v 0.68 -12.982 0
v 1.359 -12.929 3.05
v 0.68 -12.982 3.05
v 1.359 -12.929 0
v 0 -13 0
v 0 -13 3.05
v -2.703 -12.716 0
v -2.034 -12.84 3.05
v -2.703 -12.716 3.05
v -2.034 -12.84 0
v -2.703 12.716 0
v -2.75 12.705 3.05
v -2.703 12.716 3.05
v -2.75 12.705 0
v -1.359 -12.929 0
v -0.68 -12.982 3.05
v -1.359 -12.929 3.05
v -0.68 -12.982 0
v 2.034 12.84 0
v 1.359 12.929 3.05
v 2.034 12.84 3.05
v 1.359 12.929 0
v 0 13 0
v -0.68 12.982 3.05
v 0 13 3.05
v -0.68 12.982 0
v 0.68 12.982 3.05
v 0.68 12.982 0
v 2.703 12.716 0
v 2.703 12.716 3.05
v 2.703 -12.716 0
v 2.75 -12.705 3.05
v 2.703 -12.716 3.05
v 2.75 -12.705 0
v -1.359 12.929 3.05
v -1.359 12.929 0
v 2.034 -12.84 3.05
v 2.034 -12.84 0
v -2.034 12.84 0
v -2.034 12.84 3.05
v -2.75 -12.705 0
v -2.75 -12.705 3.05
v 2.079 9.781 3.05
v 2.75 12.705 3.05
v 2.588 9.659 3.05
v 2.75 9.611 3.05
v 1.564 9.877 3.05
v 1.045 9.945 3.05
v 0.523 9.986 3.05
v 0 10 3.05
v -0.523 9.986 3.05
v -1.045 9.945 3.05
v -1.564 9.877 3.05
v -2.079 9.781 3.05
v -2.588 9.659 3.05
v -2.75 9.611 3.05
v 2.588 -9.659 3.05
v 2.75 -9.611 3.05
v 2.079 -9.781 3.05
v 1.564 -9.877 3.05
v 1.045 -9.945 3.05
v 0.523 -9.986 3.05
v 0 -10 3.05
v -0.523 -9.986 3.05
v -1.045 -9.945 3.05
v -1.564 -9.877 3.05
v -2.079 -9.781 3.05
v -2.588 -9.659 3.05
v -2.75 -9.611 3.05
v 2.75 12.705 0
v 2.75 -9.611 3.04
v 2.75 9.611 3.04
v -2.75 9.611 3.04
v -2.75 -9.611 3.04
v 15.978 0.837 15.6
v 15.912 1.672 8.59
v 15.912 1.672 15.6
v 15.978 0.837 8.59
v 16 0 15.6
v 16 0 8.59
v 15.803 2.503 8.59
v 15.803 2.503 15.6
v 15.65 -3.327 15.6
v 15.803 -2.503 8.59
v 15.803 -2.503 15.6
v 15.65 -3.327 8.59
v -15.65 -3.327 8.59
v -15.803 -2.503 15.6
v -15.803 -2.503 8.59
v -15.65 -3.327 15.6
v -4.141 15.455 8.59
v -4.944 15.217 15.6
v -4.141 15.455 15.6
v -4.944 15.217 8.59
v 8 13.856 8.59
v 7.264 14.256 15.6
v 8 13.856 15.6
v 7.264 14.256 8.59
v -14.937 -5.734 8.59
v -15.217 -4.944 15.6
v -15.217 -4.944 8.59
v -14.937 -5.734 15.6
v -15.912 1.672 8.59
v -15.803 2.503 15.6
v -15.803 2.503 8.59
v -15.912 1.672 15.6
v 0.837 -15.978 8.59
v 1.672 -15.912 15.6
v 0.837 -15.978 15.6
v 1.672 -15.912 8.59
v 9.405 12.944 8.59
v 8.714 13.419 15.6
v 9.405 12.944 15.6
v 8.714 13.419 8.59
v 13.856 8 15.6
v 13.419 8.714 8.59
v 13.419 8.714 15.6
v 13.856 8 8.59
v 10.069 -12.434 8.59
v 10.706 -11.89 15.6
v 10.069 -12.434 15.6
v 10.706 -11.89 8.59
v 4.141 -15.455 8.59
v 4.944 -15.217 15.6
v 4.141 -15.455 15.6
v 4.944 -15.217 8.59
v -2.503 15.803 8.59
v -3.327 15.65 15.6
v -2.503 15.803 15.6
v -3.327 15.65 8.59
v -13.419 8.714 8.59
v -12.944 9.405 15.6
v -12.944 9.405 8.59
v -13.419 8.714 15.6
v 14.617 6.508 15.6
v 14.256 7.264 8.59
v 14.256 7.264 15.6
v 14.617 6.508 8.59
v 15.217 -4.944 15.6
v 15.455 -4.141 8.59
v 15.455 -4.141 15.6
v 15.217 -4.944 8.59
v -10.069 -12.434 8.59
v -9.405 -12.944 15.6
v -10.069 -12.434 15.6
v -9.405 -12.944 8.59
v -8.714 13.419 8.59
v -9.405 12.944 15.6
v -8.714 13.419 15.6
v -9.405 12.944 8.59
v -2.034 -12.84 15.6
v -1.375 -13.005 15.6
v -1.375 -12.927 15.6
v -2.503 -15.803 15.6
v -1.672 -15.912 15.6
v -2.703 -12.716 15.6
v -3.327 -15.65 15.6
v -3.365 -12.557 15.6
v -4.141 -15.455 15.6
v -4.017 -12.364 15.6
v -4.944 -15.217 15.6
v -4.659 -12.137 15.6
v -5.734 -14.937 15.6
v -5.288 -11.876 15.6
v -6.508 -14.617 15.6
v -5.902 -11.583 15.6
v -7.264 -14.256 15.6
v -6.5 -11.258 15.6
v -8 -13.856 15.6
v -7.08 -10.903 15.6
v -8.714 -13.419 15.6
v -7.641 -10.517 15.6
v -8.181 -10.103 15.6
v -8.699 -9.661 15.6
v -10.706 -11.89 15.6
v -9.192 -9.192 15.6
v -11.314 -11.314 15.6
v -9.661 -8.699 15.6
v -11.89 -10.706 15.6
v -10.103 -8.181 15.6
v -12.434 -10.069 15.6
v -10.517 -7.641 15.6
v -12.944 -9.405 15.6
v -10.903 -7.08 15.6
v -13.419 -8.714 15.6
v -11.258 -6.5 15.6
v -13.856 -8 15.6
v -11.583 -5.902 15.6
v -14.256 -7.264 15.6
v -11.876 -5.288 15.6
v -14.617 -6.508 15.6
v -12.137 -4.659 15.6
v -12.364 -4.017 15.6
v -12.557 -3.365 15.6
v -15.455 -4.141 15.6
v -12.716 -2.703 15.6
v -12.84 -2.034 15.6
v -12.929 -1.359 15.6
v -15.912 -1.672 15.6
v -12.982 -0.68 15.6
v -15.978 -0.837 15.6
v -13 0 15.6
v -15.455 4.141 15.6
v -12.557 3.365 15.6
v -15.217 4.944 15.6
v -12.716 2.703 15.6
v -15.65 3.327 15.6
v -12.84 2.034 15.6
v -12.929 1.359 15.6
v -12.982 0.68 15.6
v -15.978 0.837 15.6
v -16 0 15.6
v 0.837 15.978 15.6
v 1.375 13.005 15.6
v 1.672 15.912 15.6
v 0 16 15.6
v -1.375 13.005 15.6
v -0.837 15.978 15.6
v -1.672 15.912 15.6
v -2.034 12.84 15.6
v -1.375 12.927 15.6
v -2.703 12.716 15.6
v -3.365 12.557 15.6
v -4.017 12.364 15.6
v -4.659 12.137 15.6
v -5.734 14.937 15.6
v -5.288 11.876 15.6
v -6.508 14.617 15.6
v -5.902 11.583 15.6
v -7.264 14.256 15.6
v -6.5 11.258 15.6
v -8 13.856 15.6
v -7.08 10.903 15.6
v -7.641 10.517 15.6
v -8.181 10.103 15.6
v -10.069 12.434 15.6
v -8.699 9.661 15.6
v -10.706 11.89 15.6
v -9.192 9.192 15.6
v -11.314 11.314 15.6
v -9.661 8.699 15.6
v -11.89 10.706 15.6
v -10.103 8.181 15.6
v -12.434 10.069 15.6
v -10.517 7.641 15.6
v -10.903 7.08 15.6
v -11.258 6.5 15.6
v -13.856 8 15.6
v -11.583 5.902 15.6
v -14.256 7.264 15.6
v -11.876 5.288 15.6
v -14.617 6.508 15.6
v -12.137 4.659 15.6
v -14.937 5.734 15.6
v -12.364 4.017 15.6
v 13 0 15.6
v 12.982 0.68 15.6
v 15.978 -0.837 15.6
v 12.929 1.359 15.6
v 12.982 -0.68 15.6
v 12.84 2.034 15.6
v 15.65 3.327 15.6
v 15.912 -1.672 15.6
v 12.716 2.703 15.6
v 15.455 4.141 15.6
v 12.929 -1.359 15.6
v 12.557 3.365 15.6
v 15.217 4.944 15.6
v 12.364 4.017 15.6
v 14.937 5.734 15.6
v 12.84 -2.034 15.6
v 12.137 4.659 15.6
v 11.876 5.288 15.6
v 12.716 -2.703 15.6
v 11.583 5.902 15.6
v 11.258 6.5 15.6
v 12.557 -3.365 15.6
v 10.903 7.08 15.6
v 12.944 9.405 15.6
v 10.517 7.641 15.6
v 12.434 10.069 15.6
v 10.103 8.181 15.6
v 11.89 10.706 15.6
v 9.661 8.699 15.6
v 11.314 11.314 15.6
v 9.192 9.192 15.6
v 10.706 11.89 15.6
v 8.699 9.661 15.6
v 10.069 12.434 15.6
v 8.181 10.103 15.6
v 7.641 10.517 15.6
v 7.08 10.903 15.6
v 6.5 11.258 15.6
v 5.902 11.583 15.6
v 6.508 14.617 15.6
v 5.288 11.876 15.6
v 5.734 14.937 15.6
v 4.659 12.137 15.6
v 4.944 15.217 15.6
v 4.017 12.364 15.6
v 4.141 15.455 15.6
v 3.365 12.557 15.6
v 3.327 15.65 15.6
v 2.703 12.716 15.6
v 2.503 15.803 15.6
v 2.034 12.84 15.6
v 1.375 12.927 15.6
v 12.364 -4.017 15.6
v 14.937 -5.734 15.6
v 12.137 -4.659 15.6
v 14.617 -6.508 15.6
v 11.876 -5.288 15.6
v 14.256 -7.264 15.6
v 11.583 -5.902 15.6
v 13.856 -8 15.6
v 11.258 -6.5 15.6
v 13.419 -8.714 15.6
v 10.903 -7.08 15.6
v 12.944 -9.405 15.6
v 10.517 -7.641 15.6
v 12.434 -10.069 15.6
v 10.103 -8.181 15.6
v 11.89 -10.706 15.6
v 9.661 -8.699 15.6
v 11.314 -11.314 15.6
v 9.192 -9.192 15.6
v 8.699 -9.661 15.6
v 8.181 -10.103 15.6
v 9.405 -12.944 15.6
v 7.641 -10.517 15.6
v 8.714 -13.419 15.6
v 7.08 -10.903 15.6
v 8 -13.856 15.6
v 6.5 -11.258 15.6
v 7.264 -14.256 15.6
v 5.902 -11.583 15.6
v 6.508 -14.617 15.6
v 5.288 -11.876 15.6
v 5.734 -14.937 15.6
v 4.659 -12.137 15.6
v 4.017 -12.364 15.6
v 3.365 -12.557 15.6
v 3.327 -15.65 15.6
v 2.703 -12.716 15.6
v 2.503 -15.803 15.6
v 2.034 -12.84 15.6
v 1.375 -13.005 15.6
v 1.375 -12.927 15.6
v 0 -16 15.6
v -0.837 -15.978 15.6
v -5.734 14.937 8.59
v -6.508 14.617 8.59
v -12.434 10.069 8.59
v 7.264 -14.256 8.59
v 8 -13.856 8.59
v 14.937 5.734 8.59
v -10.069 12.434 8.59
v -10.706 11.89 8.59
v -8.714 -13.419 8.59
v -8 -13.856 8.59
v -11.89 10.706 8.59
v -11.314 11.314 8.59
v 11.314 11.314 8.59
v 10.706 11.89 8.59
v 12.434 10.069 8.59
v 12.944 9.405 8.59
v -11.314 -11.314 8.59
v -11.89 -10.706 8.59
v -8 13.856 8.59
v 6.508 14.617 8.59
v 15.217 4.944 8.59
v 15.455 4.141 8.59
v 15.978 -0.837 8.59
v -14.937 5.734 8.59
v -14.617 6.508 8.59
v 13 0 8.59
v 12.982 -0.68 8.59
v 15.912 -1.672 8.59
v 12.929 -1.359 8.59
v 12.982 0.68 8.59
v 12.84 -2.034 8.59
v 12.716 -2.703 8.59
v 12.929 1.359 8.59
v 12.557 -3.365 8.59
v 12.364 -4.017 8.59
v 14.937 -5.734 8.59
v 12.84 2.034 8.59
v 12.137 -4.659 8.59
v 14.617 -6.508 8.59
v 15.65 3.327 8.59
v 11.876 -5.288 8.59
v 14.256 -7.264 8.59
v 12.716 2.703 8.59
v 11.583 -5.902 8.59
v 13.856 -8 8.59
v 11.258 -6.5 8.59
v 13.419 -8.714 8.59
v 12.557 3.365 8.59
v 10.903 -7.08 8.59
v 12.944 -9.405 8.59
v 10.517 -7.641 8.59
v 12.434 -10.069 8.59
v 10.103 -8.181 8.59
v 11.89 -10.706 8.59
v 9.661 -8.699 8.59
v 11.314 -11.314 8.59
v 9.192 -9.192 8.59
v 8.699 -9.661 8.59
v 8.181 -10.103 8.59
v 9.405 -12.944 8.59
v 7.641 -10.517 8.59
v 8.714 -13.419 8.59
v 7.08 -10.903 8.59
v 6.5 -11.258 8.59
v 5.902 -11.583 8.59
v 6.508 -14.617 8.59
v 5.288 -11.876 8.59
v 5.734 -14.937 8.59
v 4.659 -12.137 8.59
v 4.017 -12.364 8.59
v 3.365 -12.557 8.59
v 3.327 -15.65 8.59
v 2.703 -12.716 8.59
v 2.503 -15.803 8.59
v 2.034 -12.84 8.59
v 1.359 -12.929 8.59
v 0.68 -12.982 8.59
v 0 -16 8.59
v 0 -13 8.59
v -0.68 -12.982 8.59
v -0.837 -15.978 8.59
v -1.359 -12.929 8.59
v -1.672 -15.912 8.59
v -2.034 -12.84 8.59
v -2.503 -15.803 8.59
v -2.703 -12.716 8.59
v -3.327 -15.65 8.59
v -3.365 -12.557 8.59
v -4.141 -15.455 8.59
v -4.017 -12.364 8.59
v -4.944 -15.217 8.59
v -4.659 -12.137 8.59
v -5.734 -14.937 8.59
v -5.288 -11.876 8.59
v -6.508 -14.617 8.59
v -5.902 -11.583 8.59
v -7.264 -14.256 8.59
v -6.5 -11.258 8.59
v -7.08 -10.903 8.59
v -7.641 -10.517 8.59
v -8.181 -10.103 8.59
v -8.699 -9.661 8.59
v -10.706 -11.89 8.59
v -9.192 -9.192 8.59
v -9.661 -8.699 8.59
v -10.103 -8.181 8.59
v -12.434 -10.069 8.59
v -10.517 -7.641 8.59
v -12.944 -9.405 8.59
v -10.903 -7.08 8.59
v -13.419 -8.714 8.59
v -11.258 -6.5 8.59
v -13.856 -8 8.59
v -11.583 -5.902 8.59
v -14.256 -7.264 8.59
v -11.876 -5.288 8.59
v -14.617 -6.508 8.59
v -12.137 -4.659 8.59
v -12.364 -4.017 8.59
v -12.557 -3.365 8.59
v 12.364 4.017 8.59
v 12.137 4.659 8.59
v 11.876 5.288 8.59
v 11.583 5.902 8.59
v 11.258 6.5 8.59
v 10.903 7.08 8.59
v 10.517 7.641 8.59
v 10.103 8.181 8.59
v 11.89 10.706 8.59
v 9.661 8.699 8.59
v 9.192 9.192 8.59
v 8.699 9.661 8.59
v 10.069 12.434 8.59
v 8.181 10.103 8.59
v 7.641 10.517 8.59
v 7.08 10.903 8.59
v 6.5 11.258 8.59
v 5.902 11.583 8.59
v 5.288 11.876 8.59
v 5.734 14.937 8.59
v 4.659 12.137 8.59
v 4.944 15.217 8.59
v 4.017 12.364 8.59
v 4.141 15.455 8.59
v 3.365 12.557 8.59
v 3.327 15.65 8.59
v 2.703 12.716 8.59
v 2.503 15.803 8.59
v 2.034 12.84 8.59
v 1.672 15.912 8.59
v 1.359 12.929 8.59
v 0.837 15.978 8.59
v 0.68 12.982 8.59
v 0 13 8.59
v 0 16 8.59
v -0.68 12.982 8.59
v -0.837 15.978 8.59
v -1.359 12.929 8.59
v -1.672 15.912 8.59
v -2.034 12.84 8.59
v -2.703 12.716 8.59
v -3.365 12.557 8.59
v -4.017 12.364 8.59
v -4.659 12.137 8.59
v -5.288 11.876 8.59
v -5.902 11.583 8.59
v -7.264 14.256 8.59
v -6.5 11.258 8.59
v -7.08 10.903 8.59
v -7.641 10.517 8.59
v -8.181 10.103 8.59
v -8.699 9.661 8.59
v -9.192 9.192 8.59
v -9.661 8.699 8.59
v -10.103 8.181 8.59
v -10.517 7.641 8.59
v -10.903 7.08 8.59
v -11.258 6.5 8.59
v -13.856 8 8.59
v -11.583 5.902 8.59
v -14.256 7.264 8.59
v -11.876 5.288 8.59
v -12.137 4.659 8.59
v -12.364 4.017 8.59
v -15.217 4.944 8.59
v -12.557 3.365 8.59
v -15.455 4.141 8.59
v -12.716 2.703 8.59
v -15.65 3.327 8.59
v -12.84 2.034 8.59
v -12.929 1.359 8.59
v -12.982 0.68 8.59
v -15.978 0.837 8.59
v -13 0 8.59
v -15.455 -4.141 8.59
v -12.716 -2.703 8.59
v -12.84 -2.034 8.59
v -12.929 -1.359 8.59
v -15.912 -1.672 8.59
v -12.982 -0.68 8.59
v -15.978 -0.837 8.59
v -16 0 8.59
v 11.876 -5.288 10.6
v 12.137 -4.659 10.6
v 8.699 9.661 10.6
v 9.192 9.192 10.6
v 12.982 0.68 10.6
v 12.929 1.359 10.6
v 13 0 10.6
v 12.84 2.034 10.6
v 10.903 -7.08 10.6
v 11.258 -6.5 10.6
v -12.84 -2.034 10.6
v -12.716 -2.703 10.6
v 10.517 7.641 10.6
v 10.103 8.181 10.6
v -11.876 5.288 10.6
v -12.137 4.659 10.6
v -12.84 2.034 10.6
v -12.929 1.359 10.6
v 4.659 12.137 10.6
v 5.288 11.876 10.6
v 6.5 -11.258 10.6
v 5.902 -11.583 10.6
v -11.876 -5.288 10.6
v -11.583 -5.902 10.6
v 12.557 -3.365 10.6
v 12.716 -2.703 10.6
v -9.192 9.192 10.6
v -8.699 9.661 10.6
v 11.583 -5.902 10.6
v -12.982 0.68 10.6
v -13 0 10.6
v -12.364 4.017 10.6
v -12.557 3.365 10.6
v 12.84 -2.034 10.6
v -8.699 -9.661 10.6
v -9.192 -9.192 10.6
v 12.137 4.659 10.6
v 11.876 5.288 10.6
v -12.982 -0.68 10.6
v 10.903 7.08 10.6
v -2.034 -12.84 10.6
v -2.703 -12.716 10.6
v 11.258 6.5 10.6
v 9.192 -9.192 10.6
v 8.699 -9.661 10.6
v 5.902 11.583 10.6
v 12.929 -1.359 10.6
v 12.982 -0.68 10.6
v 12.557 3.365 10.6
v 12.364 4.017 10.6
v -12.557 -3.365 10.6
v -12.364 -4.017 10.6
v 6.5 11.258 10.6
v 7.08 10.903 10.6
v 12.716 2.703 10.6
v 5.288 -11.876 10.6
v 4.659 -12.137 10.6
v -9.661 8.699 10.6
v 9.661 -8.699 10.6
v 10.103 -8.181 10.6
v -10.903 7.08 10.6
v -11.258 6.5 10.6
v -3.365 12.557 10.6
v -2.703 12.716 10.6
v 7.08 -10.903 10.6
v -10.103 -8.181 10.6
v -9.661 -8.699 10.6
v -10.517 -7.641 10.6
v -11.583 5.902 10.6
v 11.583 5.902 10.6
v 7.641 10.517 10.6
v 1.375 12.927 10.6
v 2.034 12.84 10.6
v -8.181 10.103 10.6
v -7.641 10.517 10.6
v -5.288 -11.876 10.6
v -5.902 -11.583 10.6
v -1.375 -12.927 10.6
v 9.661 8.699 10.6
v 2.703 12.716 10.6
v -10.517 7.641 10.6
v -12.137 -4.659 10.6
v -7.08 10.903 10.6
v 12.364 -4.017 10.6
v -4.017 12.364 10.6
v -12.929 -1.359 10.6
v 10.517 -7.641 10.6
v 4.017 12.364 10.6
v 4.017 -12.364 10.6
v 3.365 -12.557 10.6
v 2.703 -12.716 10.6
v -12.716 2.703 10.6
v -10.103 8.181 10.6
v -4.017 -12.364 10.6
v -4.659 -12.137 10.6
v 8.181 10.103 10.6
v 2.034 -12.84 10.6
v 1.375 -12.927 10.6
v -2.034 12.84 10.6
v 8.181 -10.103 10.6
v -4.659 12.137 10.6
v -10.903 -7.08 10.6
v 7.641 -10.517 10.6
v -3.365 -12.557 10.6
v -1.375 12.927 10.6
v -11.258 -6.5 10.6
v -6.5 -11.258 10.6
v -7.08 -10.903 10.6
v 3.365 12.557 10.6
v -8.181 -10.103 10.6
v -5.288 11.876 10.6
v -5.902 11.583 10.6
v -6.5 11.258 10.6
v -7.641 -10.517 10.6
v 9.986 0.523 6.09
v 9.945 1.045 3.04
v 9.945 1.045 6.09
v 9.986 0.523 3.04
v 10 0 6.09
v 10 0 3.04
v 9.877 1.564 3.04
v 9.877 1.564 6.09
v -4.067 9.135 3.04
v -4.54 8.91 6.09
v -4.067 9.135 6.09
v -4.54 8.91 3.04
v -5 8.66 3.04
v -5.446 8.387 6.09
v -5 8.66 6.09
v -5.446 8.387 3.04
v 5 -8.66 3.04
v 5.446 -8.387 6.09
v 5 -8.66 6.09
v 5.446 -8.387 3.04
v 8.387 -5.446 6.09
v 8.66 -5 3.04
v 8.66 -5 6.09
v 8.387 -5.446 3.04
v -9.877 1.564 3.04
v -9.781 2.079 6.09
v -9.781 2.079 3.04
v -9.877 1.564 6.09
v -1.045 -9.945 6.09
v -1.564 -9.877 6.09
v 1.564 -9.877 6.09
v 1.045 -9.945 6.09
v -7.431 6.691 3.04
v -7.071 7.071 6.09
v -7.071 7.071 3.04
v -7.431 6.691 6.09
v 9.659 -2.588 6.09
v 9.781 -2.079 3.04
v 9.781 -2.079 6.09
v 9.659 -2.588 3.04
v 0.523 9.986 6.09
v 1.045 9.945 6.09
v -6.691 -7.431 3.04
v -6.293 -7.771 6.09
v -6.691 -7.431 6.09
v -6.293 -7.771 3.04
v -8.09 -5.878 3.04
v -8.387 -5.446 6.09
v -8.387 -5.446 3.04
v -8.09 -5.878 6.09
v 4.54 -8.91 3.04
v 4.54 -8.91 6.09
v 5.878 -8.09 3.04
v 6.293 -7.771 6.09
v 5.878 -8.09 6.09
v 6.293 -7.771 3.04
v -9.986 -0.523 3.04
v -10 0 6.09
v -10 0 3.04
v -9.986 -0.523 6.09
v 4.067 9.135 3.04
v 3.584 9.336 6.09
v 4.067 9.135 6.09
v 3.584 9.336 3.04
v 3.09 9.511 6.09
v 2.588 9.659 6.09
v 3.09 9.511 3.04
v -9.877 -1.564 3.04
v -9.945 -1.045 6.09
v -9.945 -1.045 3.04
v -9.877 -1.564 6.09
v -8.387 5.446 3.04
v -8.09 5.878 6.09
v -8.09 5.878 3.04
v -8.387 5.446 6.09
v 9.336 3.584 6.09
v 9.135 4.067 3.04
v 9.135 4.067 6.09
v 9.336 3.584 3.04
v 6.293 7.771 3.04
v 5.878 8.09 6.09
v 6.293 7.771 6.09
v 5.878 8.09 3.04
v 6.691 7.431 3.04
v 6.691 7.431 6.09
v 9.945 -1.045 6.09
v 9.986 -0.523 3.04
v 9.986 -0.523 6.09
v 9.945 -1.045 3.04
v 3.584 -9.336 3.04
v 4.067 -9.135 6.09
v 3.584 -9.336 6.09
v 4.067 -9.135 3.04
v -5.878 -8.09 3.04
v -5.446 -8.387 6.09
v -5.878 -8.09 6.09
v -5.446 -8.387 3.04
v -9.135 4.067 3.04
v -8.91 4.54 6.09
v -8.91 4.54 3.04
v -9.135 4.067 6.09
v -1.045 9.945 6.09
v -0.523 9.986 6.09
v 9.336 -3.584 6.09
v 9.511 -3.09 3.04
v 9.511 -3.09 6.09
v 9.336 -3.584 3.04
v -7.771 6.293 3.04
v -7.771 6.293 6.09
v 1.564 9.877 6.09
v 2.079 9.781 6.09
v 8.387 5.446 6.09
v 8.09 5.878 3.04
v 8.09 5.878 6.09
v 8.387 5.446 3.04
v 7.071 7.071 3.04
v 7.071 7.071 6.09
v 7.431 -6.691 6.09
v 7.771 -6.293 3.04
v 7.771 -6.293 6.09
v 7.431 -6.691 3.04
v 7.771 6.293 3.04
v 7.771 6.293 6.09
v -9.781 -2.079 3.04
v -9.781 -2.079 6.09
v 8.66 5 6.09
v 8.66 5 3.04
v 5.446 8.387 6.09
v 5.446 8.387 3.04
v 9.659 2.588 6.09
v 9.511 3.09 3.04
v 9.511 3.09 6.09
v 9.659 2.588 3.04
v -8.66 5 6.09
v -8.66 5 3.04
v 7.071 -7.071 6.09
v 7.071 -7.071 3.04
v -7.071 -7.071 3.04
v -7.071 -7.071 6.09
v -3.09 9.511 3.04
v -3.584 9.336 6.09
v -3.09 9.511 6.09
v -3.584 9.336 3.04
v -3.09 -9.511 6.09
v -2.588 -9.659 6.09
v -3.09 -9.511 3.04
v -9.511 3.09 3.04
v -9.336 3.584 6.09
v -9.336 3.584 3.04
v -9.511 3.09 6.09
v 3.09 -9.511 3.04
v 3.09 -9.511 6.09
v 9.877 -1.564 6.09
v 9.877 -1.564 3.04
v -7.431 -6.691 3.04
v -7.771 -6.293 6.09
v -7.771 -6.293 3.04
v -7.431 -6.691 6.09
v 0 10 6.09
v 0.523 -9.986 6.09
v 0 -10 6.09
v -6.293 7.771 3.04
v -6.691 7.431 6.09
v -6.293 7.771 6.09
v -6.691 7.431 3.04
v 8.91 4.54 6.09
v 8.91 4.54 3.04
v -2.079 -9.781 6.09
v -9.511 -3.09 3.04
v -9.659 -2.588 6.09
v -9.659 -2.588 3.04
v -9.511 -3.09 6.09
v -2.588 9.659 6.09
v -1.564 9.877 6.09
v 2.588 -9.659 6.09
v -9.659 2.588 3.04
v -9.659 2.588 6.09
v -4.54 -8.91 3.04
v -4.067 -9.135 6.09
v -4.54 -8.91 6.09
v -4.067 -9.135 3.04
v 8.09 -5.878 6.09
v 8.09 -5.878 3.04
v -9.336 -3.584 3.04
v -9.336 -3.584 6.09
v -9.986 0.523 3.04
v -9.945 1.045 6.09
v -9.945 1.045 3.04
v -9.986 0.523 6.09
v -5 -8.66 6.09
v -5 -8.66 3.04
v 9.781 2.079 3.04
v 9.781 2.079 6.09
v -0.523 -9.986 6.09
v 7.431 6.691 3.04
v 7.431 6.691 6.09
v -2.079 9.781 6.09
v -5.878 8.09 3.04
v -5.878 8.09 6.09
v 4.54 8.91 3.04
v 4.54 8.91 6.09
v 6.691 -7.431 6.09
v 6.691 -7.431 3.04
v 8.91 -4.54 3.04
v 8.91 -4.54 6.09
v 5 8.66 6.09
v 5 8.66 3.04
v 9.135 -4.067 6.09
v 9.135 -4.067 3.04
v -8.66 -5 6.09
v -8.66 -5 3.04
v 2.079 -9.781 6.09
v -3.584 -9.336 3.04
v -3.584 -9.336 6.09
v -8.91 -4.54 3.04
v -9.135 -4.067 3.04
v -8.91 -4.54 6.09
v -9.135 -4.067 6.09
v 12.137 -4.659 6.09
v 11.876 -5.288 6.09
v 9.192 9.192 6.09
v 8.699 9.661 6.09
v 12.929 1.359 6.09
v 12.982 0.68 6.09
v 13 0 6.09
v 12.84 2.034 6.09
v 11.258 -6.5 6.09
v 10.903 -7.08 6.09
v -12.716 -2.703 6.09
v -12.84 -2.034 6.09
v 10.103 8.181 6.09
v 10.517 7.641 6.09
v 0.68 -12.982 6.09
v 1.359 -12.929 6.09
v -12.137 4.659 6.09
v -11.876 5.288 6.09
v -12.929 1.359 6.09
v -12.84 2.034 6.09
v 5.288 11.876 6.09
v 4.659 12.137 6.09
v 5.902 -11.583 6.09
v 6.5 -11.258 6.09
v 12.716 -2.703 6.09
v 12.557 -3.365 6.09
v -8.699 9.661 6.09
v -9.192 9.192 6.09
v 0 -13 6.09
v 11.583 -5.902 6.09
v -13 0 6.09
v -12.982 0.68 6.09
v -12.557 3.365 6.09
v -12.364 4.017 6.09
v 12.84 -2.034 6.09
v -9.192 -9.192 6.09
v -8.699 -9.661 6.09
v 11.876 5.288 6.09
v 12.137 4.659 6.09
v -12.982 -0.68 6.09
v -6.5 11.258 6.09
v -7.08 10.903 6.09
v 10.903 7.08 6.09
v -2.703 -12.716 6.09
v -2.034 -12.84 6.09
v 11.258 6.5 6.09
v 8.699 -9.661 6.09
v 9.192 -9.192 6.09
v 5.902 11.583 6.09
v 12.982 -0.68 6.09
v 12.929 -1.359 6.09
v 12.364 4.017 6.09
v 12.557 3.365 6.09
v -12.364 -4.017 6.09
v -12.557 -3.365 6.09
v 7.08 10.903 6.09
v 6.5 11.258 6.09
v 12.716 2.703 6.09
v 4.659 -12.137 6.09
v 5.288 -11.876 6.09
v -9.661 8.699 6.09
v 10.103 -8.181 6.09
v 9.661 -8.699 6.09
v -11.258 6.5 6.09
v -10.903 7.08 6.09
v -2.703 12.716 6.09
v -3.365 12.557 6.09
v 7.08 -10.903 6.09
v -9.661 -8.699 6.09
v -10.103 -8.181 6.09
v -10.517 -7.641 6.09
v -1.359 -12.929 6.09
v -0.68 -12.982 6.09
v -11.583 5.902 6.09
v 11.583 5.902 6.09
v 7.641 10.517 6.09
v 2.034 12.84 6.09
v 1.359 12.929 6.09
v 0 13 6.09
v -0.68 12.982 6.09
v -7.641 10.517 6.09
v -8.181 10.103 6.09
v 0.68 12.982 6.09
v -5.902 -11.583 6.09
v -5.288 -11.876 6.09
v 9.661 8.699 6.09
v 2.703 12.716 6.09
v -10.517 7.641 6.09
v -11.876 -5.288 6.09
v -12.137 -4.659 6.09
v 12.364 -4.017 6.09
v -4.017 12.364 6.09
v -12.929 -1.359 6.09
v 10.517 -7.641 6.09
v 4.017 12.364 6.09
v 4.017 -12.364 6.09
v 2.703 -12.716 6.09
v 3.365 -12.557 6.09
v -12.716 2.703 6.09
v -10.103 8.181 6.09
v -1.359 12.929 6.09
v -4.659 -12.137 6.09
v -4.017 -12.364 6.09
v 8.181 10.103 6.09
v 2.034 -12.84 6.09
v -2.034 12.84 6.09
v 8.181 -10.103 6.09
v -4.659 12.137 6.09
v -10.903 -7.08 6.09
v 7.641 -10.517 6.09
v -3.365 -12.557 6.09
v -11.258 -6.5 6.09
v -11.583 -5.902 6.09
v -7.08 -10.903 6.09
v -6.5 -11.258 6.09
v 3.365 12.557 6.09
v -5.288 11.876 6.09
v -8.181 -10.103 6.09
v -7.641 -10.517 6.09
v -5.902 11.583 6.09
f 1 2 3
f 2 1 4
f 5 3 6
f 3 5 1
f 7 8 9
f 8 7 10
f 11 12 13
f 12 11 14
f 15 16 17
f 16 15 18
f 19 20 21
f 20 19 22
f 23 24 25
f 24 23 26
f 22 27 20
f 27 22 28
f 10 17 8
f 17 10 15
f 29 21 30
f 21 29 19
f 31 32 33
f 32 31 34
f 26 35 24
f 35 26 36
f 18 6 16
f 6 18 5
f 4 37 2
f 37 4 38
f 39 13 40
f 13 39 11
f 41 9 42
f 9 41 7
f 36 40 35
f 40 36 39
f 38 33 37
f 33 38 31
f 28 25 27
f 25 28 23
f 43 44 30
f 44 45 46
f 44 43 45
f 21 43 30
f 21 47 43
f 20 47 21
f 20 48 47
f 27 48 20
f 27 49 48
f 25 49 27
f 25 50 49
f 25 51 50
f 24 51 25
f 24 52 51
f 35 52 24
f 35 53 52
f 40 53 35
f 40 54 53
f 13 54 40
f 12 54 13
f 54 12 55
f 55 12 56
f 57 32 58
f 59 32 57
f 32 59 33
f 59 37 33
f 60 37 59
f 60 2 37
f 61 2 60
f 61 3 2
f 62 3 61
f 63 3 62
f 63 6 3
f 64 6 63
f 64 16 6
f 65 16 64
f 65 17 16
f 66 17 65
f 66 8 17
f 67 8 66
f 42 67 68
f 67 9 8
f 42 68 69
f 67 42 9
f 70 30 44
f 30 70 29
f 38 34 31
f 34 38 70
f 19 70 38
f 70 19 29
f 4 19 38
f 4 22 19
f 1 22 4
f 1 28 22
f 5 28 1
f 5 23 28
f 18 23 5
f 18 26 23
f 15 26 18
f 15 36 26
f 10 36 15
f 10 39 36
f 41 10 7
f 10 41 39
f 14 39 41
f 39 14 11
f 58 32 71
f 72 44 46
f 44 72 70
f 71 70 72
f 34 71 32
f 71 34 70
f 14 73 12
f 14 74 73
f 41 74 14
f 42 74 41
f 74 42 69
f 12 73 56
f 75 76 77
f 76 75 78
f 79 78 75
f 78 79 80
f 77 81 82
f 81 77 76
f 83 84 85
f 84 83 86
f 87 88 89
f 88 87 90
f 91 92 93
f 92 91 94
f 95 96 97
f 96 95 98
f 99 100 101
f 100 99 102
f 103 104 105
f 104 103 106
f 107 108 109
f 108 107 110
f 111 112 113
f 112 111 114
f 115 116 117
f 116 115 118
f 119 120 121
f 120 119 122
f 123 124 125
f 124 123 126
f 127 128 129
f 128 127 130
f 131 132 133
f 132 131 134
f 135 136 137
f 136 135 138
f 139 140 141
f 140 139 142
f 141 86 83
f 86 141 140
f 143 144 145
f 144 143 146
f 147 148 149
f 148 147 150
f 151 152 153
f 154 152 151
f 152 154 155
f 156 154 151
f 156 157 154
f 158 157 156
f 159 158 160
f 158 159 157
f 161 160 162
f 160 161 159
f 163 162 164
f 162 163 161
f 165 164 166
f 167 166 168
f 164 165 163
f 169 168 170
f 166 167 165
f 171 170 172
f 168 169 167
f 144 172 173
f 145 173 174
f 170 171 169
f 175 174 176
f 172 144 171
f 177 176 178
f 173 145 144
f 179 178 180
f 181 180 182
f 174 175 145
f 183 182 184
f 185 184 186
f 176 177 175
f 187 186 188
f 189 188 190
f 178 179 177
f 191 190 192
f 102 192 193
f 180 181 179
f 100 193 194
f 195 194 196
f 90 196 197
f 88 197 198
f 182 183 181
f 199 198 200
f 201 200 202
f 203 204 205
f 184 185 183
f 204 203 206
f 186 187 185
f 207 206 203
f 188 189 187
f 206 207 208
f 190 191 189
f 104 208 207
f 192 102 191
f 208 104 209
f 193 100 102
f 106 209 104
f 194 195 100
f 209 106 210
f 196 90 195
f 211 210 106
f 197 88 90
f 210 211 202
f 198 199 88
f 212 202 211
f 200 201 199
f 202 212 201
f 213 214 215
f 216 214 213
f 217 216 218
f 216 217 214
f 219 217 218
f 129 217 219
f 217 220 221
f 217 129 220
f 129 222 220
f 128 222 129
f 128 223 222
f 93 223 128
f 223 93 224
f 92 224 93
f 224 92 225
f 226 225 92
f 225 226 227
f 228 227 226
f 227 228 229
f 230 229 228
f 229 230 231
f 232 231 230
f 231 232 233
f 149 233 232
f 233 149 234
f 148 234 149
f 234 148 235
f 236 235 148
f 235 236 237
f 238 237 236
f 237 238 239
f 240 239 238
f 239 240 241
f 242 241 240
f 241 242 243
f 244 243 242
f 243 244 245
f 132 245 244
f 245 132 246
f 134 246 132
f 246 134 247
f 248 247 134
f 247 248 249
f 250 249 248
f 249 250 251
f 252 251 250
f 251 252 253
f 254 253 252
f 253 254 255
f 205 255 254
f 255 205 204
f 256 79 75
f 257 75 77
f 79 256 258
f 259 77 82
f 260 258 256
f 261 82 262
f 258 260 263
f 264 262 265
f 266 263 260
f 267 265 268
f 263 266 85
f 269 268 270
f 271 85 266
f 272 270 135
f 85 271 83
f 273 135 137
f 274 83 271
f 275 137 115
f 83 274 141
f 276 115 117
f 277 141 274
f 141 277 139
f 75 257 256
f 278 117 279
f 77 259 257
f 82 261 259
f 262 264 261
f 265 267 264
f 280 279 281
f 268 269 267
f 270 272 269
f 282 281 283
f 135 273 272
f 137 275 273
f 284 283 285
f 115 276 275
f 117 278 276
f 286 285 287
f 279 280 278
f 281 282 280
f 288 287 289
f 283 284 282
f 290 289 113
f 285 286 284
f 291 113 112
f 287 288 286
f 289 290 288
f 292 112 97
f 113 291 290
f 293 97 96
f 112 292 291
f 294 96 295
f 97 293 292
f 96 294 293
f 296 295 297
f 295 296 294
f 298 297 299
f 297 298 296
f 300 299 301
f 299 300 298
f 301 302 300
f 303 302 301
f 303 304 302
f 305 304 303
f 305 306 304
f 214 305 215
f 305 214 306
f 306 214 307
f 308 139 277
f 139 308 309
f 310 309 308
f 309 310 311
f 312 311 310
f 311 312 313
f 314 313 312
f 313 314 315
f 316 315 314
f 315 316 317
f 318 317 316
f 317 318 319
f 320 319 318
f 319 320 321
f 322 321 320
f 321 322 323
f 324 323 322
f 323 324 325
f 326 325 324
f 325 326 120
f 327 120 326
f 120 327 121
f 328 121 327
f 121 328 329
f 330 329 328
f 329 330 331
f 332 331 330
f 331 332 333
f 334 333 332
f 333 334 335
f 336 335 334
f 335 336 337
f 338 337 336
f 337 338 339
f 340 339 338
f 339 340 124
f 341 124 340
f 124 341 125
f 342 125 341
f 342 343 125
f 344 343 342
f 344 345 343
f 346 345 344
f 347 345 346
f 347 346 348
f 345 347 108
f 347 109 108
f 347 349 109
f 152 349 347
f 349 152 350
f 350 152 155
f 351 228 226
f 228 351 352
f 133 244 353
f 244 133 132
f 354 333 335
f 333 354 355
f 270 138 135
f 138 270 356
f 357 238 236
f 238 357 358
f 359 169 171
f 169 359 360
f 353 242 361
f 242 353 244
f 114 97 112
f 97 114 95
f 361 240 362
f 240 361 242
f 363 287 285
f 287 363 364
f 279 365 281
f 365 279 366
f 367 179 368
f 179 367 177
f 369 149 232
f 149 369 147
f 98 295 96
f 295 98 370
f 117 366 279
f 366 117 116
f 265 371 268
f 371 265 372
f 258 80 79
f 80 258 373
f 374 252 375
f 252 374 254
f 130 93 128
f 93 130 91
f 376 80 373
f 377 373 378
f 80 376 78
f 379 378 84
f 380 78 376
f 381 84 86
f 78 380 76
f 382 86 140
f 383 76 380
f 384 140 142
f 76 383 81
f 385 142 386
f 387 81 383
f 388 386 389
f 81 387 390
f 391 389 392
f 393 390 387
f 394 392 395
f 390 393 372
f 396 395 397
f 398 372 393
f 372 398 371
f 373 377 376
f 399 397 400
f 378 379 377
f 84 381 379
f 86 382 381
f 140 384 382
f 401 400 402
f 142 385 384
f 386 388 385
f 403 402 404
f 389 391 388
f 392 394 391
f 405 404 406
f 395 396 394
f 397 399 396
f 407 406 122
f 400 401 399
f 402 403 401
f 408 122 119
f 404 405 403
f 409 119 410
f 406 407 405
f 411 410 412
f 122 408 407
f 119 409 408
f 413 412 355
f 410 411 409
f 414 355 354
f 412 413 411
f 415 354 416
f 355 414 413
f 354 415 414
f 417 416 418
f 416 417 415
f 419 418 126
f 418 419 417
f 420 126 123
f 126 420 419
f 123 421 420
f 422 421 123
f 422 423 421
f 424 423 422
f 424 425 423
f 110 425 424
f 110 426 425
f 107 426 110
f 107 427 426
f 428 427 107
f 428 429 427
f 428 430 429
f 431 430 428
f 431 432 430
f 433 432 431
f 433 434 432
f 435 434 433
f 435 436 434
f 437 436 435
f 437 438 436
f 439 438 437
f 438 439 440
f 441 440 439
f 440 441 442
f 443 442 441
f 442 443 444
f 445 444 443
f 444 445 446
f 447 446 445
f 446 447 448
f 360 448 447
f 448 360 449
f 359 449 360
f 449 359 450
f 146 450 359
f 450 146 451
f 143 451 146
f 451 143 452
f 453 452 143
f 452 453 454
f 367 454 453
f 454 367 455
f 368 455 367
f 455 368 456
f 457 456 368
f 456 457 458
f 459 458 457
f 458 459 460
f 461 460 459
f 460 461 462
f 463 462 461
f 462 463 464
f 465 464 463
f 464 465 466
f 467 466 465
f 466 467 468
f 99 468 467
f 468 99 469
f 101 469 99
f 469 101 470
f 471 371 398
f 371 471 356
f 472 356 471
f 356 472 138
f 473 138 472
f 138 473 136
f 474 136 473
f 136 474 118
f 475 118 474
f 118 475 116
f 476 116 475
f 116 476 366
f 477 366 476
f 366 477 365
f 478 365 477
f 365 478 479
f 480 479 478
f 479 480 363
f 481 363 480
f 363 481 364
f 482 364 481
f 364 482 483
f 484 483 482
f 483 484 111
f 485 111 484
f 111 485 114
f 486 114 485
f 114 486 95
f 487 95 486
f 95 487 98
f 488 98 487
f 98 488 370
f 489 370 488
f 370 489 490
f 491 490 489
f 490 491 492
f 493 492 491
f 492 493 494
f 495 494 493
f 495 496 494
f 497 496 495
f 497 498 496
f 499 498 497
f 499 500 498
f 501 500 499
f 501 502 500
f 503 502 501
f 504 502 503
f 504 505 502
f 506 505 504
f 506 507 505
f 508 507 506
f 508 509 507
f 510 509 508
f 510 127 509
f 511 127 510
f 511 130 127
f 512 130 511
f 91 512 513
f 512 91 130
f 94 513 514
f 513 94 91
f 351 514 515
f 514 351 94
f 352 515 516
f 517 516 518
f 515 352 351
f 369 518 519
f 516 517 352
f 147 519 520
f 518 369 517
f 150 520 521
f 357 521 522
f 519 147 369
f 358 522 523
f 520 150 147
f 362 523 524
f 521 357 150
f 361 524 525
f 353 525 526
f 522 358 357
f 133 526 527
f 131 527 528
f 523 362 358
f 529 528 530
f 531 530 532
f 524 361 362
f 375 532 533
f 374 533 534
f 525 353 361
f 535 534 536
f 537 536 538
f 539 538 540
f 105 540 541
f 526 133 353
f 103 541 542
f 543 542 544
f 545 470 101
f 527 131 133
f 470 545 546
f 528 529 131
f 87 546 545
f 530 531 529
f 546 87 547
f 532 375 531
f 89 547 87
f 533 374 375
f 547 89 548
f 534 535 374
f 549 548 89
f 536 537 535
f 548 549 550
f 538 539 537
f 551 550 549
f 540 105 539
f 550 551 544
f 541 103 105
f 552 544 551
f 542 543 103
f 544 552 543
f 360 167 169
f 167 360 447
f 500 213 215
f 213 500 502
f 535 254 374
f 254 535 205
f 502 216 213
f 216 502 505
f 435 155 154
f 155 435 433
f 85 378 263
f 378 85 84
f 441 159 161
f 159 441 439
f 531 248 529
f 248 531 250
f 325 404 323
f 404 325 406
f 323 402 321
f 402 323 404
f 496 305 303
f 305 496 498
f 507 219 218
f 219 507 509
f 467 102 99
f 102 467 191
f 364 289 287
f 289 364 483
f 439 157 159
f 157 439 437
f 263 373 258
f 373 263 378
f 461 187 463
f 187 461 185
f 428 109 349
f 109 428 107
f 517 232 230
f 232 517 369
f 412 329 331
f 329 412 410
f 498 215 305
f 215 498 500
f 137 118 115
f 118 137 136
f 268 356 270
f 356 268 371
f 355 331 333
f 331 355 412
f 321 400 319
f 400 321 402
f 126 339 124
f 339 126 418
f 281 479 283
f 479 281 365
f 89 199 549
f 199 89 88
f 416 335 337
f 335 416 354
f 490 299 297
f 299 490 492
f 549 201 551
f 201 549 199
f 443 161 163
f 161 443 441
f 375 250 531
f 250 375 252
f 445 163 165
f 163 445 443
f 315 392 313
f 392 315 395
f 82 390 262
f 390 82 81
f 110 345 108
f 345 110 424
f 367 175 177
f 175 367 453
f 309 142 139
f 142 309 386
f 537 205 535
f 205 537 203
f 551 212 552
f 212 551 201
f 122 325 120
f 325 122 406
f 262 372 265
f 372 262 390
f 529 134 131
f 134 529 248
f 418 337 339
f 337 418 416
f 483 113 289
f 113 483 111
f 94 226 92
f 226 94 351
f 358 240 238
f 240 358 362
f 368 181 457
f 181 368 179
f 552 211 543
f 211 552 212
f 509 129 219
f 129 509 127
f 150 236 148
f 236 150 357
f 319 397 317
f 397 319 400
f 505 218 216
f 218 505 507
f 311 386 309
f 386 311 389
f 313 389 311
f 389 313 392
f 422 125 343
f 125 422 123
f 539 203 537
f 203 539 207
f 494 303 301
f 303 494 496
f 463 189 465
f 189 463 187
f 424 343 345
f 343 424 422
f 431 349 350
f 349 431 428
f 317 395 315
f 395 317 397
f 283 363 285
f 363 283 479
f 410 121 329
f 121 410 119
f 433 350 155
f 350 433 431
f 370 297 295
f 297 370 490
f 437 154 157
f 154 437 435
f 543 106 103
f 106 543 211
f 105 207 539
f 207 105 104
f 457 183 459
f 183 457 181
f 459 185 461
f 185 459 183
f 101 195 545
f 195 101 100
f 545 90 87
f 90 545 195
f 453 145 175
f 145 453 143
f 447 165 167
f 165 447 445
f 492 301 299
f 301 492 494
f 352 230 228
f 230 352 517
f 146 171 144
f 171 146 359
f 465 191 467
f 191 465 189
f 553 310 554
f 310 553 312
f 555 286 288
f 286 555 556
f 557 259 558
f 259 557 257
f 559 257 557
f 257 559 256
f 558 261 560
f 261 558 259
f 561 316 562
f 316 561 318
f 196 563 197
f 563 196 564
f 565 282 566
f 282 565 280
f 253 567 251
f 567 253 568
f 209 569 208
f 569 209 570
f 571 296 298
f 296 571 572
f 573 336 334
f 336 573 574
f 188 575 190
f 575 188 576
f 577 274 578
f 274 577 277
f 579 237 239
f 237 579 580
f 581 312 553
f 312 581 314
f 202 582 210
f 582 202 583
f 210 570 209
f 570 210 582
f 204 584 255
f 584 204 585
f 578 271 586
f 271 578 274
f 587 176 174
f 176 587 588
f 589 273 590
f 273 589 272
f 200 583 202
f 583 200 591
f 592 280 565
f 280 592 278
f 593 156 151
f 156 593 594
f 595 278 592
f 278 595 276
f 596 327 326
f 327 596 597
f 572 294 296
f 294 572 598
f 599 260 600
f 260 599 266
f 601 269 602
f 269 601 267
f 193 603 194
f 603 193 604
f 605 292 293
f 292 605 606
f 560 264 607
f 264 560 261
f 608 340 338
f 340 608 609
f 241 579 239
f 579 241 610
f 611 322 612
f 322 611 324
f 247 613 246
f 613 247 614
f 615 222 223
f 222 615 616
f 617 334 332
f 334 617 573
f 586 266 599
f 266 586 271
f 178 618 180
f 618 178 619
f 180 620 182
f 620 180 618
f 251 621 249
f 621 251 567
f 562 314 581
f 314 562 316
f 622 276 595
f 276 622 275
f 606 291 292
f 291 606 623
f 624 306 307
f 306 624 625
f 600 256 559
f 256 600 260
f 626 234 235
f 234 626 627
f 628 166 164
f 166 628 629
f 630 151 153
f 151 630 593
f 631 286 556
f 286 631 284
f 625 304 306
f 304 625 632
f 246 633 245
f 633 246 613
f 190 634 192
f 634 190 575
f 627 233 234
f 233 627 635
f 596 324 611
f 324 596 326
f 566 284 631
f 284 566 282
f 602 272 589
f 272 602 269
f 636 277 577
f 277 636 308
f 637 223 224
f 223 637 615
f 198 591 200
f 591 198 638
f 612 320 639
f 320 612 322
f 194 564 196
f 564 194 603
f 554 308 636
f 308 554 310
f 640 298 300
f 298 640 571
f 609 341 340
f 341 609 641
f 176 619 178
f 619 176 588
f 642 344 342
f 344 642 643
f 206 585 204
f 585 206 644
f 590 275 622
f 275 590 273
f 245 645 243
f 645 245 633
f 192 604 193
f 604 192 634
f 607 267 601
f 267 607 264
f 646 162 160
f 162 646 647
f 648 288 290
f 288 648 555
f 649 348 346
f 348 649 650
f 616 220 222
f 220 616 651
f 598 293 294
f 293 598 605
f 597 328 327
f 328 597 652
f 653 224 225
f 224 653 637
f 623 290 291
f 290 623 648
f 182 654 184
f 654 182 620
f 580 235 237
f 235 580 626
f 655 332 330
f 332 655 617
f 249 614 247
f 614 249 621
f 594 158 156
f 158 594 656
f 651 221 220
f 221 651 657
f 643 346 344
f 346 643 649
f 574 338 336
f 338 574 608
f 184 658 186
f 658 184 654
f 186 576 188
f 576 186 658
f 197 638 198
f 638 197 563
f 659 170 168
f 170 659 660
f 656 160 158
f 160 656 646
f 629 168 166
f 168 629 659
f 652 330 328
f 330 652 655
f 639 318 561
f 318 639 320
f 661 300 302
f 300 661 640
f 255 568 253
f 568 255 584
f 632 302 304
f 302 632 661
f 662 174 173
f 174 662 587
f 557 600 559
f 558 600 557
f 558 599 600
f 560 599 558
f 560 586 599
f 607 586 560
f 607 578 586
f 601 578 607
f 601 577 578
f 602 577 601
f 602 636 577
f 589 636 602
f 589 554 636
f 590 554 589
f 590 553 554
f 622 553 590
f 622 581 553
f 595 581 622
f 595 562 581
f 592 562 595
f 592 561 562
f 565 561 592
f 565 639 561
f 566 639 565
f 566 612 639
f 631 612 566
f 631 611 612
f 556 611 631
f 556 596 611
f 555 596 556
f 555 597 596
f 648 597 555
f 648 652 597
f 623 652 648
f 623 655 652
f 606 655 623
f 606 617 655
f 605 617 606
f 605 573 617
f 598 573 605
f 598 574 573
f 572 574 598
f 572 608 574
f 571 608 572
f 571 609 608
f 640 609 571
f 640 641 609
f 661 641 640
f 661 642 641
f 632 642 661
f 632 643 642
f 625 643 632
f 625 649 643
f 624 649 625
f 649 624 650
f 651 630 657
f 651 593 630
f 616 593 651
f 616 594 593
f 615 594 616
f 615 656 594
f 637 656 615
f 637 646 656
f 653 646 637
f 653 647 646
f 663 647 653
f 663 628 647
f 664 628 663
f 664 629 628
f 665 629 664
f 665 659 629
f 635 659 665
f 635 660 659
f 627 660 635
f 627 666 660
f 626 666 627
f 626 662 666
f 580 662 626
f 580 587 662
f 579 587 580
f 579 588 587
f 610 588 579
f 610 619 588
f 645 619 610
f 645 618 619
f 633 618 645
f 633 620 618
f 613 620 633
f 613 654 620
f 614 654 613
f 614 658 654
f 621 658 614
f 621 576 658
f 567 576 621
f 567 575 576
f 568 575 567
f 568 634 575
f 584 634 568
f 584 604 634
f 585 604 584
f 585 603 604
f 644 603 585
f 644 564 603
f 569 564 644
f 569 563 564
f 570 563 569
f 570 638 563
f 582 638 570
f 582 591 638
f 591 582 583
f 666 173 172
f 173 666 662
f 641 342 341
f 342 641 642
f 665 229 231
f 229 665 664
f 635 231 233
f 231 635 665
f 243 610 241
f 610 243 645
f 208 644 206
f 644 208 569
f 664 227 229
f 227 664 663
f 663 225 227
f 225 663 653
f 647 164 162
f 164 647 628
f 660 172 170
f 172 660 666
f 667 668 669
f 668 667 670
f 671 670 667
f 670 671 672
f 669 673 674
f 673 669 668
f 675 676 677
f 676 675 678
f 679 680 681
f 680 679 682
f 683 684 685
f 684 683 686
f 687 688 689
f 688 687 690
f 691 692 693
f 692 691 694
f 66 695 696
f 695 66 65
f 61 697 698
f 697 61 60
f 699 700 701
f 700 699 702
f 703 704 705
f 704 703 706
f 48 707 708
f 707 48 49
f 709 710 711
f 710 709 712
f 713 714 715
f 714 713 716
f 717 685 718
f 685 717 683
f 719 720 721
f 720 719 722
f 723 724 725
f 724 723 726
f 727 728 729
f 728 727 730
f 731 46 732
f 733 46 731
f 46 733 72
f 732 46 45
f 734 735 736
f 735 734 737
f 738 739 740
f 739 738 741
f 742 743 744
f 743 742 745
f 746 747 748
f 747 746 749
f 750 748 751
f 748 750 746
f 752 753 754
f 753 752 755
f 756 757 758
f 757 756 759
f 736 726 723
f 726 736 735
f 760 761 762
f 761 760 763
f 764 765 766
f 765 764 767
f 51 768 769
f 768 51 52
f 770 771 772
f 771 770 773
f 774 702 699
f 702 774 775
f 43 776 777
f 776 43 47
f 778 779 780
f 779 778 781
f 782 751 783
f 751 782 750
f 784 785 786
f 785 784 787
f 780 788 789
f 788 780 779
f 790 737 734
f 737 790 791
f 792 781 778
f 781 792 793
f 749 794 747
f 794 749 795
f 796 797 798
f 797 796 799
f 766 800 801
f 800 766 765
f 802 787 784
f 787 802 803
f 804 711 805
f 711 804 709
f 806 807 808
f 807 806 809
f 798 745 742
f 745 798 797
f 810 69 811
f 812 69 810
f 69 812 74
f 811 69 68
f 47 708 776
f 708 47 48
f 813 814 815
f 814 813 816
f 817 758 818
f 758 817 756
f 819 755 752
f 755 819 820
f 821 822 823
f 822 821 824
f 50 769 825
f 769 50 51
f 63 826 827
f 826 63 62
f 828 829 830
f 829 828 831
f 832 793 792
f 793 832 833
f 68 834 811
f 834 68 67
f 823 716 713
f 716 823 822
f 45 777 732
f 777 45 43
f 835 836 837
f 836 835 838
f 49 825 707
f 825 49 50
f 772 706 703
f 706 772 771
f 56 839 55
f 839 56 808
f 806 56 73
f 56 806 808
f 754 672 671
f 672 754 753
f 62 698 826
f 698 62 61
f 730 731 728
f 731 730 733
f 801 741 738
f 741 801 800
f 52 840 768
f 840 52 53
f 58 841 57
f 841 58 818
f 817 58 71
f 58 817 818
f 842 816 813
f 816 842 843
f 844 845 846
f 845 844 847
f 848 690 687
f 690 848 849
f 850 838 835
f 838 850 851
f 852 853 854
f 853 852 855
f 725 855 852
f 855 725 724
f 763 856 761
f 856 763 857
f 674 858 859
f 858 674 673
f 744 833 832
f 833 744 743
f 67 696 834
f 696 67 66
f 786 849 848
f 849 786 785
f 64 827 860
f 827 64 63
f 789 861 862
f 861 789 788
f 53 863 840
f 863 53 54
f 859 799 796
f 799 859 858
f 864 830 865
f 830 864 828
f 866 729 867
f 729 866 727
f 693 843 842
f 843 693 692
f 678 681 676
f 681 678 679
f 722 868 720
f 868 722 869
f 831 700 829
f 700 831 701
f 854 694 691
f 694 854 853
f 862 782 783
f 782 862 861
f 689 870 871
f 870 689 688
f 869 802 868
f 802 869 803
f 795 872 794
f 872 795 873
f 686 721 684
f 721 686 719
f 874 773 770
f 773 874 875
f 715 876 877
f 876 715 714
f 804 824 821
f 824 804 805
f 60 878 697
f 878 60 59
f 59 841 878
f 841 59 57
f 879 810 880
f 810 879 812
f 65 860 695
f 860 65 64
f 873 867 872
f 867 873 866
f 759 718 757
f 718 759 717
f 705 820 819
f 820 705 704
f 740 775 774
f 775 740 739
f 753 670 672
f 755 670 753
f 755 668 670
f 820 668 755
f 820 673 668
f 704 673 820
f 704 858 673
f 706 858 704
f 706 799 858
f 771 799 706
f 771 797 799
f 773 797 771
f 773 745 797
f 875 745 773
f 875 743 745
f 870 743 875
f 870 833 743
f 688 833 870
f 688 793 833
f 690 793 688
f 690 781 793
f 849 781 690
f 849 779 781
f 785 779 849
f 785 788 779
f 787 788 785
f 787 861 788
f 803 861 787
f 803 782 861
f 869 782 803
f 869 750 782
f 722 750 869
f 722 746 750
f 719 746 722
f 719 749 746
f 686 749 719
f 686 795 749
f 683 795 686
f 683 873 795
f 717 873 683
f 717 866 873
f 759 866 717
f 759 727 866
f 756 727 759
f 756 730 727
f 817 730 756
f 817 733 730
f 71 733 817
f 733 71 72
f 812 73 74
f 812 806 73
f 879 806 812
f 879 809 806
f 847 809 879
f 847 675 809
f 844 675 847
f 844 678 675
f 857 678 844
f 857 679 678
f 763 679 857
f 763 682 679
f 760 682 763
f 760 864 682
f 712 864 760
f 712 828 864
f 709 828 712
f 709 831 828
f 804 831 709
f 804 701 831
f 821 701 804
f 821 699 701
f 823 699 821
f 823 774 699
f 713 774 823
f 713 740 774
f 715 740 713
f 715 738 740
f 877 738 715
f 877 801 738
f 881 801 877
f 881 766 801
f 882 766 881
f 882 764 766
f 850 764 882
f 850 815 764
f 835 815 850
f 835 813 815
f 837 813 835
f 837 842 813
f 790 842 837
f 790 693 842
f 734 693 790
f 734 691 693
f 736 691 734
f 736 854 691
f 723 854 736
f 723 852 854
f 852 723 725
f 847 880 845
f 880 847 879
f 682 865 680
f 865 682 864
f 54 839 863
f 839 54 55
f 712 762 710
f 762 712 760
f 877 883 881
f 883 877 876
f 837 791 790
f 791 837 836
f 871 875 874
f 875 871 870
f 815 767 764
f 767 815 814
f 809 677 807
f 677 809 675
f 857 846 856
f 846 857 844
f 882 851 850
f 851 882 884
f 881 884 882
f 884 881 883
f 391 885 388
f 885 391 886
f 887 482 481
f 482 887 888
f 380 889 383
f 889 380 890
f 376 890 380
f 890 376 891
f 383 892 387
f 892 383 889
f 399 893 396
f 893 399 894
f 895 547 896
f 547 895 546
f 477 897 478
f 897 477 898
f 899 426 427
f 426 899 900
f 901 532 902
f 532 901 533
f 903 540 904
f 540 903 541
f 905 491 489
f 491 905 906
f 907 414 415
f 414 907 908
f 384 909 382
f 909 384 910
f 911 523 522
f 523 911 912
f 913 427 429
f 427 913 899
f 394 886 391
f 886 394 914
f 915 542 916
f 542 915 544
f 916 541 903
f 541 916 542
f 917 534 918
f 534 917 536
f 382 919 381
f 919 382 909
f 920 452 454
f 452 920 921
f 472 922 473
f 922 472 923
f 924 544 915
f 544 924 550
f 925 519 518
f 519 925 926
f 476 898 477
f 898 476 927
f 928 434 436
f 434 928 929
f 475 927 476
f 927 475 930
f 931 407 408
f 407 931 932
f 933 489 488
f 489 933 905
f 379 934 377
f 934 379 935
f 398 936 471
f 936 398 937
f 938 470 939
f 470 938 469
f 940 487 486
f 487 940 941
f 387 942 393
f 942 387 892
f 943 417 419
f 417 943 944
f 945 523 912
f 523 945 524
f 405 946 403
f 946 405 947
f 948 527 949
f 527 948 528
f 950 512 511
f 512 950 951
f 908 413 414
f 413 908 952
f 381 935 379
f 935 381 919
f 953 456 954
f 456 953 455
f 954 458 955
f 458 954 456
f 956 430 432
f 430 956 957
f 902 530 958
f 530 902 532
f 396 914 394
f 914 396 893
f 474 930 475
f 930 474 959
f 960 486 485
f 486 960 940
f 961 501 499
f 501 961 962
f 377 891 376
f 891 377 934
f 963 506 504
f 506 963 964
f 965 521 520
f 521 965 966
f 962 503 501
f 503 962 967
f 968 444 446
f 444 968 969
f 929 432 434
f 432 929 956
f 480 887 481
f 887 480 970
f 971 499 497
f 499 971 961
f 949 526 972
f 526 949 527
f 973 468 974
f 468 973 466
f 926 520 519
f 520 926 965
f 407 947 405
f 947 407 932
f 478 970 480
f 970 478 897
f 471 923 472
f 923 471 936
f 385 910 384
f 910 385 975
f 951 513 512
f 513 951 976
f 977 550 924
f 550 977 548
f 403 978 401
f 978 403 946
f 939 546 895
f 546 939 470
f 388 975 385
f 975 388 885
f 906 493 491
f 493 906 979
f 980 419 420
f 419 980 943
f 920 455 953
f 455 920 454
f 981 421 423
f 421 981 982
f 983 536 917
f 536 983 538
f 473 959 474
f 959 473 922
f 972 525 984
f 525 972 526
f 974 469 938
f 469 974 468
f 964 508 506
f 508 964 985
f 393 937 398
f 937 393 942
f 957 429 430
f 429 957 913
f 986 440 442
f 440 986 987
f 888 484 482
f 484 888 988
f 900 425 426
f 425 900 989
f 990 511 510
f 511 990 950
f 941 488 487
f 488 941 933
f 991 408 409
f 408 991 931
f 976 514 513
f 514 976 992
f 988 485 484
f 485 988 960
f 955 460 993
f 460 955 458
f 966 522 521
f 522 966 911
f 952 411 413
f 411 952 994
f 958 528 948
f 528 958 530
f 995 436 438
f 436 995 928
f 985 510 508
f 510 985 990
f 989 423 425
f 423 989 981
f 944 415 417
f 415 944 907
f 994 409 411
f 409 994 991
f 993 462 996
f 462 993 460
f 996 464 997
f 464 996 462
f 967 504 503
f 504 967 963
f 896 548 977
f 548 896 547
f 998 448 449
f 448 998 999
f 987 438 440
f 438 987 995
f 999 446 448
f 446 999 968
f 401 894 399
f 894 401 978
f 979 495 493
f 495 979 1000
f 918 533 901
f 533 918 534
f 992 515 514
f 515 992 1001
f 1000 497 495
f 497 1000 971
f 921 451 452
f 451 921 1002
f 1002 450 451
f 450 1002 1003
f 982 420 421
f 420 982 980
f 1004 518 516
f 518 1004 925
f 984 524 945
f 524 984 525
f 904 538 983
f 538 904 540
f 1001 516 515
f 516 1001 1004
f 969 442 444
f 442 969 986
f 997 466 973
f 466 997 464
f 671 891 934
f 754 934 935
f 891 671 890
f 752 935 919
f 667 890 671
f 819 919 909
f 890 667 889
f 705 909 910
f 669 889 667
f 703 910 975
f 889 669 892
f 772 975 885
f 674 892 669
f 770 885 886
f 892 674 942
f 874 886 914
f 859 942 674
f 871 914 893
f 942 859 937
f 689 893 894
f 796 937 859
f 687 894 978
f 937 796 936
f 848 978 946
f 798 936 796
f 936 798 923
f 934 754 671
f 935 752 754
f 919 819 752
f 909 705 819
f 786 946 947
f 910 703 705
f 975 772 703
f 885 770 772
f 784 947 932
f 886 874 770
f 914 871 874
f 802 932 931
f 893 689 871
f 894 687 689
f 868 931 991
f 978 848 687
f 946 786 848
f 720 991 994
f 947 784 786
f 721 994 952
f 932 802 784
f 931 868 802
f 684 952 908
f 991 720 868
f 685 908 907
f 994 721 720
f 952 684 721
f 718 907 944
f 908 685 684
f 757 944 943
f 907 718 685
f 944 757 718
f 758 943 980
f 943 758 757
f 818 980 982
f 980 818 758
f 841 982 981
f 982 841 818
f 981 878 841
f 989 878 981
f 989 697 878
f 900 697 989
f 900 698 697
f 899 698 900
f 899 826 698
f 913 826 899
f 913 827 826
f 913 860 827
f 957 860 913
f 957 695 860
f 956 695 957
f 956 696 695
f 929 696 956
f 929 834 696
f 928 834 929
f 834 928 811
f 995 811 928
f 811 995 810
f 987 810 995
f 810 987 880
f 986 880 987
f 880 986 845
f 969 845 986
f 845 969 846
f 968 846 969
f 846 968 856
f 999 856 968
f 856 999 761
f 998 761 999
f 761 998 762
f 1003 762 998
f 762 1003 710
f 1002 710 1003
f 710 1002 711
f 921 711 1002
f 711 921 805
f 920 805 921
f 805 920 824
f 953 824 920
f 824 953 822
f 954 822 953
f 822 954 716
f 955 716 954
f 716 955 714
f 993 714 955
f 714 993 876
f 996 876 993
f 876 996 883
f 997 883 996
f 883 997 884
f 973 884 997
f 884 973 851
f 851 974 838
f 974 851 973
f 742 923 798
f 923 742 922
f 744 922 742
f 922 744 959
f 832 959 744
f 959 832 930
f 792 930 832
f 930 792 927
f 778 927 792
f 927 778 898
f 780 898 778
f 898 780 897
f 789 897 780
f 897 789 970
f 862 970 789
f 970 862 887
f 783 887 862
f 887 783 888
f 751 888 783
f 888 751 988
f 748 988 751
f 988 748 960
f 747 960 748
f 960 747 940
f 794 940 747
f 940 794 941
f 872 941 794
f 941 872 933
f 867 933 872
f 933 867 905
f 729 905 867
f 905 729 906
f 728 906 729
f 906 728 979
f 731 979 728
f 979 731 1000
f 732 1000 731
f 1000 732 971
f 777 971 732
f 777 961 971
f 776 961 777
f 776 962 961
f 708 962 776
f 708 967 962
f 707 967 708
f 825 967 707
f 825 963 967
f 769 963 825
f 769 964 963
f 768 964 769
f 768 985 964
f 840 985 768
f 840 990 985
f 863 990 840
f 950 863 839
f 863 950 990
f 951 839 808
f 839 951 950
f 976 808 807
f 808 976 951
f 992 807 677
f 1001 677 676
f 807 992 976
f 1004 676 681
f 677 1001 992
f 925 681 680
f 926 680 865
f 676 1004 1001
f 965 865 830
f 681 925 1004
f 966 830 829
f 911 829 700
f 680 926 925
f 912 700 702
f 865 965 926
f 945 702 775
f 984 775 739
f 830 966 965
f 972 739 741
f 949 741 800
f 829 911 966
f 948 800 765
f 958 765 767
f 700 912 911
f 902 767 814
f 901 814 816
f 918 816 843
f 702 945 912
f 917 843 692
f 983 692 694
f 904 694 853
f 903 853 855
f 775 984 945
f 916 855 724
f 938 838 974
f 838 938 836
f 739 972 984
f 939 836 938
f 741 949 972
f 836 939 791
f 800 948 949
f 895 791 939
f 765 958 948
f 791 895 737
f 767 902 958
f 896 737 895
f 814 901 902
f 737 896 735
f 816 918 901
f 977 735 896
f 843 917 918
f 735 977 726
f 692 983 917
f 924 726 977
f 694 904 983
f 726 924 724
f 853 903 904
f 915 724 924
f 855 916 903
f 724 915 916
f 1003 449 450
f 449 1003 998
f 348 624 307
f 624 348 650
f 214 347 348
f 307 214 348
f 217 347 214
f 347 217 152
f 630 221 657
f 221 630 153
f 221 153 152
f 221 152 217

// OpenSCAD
$fn=120;

di = 3.05;
do=2.5;
or= 26/2;
ir= 20/2;
tr=or+6/2;
th= 7;
thi=5;
wo=5.5;
i = 0.01;

difference() {
	cylinder(h=di,r=or);
	translate([wo/2,-or,-di]) cube(size=[or,or*2,di*3]);
	translate([-or-wo/2,-or,-di]) cube(size=[or,or*2,di*3]);
}

translate([0,0,di-i]) cylinder(h=di+i,r=ir);
translate([0,0,di+di-i]) cylinder(h=do+i,r=or);
translate([0,0,2*di+do-i]) difference() {
		cylinder(h=th+i,r=tr);
		translate([0,0,th-thi+i]) cylinder(h=thi+2*i,r=or);		
	}

translate([0,0,2*di+do+th/2]) cube(size=[wo/2,or*2+i,th],center=true);
